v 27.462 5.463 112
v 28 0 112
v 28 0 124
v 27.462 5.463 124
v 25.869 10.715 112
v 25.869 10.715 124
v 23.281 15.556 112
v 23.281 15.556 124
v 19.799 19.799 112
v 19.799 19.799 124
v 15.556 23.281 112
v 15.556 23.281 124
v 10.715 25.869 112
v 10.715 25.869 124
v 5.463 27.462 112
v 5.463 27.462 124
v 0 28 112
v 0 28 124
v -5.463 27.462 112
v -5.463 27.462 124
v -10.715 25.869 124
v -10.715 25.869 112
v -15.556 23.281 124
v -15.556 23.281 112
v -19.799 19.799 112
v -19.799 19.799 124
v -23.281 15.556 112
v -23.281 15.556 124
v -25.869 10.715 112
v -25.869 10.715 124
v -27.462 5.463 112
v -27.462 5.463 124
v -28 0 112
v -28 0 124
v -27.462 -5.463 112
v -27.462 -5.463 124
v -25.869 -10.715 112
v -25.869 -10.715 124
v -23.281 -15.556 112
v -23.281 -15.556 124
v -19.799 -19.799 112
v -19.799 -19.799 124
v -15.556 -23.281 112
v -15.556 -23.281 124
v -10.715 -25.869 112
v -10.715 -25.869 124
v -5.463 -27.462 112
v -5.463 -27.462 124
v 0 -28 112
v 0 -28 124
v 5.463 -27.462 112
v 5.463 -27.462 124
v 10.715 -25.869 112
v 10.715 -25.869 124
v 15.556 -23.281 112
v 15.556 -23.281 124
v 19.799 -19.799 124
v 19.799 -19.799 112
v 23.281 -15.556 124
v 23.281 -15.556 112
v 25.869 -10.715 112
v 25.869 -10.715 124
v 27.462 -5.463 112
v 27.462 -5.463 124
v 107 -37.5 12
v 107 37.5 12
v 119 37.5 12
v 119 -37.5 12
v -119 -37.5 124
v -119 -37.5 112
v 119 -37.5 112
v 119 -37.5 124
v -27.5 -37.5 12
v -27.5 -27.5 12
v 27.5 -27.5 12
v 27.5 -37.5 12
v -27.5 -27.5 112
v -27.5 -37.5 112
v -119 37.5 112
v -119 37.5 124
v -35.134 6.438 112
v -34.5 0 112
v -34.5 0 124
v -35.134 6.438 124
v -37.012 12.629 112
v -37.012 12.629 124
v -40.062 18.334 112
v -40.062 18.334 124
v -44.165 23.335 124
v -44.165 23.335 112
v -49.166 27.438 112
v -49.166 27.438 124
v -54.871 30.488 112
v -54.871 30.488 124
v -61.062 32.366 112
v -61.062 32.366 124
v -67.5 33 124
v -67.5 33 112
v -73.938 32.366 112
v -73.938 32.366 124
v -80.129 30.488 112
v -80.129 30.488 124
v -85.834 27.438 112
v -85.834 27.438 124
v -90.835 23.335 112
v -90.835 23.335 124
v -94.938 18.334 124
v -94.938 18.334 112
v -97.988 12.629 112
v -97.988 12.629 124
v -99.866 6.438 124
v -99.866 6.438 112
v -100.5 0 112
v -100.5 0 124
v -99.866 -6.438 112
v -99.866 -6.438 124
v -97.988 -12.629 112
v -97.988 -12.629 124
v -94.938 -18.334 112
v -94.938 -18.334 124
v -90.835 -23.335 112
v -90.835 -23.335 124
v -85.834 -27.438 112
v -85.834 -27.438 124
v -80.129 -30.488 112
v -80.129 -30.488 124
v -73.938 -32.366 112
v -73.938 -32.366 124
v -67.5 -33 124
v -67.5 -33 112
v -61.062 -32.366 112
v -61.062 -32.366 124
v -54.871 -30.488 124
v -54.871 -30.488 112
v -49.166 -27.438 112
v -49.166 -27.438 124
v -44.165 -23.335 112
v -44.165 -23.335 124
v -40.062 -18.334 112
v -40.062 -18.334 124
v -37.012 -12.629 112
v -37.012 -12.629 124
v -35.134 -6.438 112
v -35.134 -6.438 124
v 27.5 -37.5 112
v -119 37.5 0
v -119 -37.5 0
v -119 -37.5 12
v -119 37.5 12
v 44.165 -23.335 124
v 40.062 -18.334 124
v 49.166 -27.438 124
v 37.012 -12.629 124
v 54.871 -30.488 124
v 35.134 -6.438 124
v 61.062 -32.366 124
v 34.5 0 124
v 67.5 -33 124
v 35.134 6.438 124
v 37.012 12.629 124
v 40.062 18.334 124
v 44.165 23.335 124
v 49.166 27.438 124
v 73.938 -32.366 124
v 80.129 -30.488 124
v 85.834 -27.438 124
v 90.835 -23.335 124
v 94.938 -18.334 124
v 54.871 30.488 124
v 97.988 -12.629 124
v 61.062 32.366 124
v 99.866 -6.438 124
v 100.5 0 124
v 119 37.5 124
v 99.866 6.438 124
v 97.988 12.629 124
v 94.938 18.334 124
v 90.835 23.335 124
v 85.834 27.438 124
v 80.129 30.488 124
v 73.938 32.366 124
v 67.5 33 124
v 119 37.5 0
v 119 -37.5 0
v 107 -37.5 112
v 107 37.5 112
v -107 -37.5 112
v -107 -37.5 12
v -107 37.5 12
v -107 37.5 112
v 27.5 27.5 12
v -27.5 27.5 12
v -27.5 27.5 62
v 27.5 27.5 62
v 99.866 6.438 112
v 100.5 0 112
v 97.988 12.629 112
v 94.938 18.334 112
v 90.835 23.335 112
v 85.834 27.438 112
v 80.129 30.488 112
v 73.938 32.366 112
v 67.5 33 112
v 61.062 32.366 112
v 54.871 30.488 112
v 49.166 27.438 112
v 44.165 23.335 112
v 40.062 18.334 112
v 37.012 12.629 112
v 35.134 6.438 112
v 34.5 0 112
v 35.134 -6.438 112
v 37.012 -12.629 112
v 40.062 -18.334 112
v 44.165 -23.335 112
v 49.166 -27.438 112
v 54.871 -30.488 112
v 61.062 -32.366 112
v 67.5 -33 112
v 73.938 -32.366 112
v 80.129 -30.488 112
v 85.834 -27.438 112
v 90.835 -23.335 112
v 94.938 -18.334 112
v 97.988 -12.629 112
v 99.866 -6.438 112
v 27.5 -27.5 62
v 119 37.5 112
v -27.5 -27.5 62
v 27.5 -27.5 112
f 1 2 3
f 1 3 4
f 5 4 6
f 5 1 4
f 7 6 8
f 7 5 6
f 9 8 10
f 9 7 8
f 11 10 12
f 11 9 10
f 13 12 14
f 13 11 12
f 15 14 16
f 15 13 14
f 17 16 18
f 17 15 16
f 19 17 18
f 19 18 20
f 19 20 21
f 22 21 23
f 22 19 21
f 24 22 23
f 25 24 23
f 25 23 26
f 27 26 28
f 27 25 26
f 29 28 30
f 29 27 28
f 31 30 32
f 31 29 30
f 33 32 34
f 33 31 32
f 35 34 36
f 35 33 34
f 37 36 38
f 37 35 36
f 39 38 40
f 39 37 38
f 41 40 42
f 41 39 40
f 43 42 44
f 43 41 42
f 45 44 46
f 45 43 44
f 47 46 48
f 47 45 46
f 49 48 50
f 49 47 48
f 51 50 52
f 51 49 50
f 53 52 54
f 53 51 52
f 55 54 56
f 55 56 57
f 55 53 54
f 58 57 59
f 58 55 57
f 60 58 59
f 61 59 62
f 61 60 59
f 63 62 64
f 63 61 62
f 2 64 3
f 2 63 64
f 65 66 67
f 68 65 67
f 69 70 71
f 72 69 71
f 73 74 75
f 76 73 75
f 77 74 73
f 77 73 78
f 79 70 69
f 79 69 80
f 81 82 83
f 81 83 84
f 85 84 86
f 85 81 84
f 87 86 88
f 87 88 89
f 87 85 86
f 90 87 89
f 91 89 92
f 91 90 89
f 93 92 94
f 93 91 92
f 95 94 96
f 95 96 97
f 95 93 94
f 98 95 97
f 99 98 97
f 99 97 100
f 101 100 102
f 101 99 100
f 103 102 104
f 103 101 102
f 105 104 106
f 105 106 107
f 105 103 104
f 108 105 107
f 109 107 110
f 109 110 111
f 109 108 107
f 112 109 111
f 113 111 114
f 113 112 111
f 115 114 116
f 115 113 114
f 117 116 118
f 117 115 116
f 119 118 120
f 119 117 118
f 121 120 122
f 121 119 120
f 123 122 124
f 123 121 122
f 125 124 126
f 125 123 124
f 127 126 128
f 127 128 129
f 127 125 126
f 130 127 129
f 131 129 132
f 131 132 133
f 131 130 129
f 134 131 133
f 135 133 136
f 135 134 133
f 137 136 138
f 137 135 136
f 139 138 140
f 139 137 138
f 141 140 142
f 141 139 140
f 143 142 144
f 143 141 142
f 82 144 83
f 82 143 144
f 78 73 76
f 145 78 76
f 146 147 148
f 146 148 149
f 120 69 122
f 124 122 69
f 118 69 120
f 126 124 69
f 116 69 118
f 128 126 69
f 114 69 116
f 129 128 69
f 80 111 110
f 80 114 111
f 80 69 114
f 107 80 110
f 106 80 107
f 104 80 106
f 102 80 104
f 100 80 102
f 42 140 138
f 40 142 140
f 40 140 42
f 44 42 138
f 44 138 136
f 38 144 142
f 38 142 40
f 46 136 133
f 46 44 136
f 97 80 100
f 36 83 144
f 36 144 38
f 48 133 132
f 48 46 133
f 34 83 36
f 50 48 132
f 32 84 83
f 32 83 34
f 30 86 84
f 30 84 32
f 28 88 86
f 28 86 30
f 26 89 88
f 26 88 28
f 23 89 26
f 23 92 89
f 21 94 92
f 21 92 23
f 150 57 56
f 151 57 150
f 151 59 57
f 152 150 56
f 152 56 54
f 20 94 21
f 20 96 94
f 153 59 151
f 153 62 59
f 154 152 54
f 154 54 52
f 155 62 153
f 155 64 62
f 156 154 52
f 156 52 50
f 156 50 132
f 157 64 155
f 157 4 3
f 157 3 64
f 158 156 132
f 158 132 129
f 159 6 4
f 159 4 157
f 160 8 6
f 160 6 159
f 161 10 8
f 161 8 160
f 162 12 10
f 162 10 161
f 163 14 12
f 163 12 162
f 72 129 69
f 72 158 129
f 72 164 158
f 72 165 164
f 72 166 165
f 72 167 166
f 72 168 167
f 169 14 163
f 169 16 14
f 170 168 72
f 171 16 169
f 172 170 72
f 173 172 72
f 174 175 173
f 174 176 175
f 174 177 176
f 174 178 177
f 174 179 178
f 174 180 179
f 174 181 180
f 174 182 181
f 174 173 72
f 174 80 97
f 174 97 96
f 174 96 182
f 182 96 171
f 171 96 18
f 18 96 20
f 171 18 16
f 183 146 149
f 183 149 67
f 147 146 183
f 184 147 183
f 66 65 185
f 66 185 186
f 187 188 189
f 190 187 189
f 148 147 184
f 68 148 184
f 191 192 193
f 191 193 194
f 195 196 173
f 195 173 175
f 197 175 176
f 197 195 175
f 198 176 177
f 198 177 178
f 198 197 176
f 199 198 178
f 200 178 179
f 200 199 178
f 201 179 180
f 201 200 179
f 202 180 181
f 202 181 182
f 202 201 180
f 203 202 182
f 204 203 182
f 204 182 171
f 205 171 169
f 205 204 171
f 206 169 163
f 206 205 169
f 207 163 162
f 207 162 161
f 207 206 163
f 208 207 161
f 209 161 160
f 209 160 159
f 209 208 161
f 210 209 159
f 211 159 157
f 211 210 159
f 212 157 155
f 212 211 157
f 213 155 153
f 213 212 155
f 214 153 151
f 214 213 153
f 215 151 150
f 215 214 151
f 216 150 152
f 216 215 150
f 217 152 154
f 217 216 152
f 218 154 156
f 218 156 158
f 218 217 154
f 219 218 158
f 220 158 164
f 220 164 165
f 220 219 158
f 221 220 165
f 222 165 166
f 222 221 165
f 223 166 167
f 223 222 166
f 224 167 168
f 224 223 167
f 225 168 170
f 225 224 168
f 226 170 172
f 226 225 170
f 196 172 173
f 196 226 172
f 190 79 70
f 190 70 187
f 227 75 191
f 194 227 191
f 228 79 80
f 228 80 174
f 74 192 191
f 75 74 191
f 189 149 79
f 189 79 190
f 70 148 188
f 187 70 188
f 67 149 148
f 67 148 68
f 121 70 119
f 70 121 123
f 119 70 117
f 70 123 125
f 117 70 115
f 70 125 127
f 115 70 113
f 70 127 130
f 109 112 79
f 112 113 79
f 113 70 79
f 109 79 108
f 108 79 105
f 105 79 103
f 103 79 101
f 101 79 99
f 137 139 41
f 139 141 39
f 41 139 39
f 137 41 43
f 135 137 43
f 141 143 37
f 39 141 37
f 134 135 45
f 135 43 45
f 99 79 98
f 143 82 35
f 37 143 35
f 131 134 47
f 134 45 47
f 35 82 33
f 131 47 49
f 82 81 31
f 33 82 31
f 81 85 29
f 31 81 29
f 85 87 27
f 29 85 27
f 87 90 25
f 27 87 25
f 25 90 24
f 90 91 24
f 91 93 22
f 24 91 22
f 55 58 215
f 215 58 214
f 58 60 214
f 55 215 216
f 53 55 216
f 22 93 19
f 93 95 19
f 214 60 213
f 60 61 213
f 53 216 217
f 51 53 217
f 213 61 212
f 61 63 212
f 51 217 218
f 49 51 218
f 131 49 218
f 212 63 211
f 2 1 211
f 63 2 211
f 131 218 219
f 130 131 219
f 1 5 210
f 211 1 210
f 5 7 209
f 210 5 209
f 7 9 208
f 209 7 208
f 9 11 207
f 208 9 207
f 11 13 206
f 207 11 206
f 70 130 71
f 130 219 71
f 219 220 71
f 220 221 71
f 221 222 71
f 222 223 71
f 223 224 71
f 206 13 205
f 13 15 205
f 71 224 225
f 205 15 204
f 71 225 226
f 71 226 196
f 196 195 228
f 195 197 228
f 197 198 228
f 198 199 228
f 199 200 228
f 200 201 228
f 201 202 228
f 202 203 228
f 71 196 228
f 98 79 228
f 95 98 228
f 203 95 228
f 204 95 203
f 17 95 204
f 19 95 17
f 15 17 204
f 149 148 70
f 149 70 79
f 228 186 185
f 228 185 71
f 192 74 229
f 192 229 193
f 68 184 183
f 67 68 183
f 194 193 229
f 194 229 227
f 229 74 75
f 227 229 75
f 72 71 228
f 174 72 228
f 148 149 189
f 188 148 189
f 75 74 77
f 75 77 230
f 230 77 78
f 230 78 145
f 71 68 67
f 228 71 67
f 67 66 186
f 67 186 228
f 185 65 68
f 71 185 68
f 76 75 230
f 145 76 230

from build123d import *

# Parameters (mm, degrees)
F0_W      = 238
F0_H      = 75
F1_DEPTH  = 12
F3_W      = 238
F3_H      = 75
F3_R      = 33
F3_R_2    = 28
F4_DEPTH  = 12
F5_W      = 12
F5_H      = 75
F6_DEPTH  = 100
F7_W      = 55
F7_H      = 55
F8_DEPTH  = 50
F9_W      = 55
F9_H      = 100
F10_DEPTH = 10


with BuildPart() as f1:
    # F0 (on Top) → F1 (new body)
    with BuildSketch(Plane.XY):
        Rectangle(F0_W, F0_H)
    extrude(amount=F1_DEPTH)


with BuildPart() as f4:
    # F3 (on offset) → F4 (new body)
    with BuildSketch(Plane.XY.offset(112)):
        Rectangle(F3_W, F3_H)
        with Locations((-67.5, 0)):
            Circle(F3_R, mode=Mode.SUBTRACT)
        Circle(F3_R_2, mode=Mode.SUBTRACT)
        with Locations((67.5, 0)):
            Circle(F3_R, mode=Mode.SUBTRACT)
    extrude(amount=F4_DEPTH)


with BuildPart() as f6:
    # F5 (on face) → F6 (new body, through all)
    with BuildSketch(Plane.XY.offset(12)):
        with Locations((-113, 0)):
            Rectangle(F5_W, F5_H)
        with Locations((113, 0)):
            Rectangle(F5_W, F5_H)
    extrude(amount=F6_DEPTH)


with BuildPart() as f8:
    # F7 (on face) → F8 (new body)
    with BuildSketch(Plane.XY.offset(12)):
        Rectangle(F7_W, F7_H)
    extrude(amount=F8_DEPTH)


with BuildPart() as f10:
    # F9 (on face) → F10 (new body)
    with BuildSketch(Plane.XZ.offset(27.5)):
        with Locations((0, 62)):
            Rectangle(F9_W, F9_H)
    extrude(amount=F10_DEPTH)


solid = Compound([f1.part, f4.part, f6.part, f8.part, f10.part])
